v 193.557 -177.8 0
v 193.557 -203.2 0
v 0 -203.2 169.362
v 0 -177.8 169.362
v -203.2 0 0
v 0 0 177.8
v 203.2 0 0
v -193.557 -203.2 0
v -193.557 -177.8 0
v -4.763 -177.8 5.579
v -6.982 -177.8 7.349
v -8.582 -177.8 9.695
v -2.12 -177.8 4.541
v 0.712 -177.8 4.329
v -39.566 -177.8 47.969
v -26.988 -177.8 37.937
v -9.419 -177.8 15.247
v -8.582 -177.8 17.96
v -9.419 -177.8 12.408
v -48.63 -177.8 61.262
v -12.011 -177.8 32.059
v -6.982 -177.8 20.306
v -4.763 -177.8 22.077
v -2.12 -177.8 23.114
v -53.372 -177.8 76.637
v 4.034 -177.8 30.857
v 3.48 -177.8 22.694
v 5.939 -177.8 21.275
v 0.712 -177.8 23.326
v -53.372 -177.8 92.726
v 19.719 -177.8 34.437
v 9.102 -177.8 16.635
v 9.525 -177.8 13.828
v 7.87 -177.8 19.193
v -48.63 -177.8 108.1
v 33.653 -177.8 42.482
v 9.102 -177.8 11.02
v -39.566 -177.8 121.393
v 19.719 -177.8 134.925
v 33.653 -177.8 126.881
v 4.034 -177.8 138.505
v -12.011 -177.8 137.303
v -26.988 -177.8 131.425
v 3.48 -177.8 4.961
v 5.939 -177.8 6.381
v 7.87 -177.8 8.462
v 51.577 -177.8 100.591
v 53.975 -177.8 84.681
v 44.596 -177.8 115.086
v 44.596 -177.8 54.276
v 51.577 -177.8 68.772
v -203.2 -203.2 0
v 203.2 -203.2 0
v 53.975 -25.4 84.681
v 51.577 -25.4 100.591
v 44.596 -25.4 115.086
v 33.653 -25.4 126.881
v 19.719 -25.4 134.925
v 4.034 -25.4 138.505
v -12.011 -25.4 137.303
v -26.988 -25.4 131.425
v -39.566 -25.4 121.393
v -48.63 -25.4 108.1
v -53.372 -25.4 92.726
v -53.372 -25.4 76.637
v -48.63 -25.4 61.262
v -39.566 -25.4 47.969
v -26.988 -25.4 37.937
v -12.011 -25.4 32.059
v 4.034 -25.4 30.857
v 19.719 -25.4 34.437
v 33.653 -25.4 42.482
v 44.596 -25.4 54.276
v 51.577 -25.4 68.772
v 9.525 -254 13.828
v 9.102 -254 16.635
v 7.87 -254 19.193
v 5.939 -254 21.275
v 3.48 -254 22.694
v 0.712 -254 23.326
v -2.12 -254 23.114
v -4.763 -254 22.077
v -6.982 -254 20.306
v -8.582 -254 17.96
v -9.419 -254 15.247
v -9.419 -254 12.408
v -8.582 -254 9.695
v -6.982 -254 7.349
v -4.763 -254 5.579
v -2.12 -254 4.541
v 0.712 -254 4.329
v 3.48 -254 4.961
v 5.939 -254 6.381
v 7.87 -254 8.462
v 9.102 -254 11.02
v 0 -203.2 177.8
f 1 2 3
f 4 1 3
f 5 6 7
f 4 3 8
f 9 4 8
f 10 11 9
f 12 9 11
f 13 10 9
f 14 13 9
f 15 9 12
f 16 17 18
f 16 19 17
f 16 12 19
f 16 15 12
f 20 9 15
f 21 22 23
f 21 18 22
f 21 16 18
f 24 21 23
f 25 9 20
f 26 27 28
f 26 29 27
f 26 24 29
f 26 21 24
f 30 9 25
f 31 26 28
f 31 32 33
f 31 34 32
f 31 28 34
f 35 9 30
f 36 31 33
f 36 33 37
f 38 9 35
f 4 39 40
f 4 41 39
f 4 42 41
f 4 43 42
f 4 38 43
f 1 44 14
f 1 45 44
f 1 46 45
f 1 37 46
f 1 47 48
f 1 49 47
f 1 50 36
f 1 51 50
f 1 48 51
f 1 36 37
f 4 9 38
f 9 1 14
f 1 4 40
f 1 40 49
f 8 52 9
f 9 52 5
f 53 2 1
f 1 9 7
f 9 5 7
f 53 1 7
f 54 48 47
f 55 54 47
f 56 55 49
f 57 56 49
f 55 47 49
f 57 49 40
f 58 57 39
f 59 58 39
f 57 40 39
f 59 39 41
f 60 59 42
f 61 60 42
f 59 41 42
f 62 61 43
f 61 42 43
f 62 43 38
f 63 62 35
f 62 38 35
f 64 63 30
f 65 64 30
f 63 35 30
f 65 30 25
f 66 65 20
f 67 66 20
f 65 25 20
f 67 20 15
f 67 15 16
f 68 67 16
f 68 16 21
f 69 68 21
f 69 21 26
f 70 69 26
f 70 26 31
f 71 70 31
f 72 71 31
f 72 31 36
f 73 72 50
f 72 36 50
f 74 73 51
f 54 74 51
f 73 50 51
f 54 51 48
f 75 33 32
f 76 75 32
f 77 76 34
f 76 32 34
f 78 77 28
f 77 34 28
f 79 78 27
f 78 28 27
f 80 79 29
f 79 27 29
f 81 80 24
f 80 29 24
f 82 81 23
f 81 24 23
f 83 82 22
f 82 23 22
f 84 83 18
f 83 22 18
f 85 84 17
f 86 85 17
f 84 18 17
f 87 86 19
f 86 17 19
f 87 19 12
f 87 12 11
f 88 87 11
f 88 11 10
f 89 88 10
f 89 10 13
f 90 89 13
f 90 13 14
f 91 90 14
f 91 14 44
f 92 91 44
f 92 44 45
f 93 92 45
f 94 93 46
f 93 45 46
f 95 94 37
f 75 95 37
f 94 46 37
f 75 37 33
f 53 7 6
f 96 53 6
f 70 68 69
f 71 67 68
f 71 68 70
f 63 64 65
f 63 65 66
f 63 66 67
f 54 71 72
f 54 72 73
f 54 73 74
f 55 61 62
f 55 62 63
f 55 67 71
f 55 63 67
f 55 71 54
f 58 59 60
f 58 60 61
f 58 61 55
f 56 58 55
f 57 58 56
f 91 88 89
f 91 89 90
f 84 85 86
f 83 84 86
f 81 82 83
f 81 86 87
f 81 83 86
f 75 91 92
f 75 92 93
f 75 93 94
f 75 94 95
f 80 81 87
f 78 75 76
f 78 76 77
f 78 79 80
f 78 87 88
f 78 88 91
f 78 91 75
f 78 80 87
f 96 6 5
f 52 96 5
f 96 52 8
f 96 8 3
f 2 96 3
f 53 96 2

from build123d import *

# Parameters (mm, degrees)
F1_DEPTH = 203.2
F3_DEPTH = 25.4
F4_R     = 53.975
F5_DEPTH = 152.4
F4_R_2   = 9.525
F6_DEPTH = 76.2


with BuildPart() as f1:
    # F0 (on Front) → F1 (new body)
    with BuildSketch(Plane.XZ):
        Polygon((0, 177.8), (-203.2, 0), (203.2, 0), align=None)
    extrude(amount=F1_DEPTH)

    # F2 (on face) → F3 (cut)
    with BuildSketch(Plane.XZ.offset(203.2)):
        Polygon((0, 169.362322), (-193.556939, 0), (193.556939, 0), align=None)
    extrude(amount=-F3_DEPTH, mode=Mode.SUBTRACT)

    # F4 (on face) → F5 (cut)
    with BuildSketch(Plane.XZ.offset(177.8)):
        with Locations((0, 84.681161)):
            Circle(F4_R)
    extrude(amount=-F5_DEPTH, mode=Mode.SUBTRACT)

    # F4 (on face) → F6 (join)
    with BuildSketch(Plane.XZ.offset(177.8)):
        with Locations((0, 13.827616)):
            Circle(F4_R_2)
    extrude(amount=F6_DEPTH)


solid = f1.part
